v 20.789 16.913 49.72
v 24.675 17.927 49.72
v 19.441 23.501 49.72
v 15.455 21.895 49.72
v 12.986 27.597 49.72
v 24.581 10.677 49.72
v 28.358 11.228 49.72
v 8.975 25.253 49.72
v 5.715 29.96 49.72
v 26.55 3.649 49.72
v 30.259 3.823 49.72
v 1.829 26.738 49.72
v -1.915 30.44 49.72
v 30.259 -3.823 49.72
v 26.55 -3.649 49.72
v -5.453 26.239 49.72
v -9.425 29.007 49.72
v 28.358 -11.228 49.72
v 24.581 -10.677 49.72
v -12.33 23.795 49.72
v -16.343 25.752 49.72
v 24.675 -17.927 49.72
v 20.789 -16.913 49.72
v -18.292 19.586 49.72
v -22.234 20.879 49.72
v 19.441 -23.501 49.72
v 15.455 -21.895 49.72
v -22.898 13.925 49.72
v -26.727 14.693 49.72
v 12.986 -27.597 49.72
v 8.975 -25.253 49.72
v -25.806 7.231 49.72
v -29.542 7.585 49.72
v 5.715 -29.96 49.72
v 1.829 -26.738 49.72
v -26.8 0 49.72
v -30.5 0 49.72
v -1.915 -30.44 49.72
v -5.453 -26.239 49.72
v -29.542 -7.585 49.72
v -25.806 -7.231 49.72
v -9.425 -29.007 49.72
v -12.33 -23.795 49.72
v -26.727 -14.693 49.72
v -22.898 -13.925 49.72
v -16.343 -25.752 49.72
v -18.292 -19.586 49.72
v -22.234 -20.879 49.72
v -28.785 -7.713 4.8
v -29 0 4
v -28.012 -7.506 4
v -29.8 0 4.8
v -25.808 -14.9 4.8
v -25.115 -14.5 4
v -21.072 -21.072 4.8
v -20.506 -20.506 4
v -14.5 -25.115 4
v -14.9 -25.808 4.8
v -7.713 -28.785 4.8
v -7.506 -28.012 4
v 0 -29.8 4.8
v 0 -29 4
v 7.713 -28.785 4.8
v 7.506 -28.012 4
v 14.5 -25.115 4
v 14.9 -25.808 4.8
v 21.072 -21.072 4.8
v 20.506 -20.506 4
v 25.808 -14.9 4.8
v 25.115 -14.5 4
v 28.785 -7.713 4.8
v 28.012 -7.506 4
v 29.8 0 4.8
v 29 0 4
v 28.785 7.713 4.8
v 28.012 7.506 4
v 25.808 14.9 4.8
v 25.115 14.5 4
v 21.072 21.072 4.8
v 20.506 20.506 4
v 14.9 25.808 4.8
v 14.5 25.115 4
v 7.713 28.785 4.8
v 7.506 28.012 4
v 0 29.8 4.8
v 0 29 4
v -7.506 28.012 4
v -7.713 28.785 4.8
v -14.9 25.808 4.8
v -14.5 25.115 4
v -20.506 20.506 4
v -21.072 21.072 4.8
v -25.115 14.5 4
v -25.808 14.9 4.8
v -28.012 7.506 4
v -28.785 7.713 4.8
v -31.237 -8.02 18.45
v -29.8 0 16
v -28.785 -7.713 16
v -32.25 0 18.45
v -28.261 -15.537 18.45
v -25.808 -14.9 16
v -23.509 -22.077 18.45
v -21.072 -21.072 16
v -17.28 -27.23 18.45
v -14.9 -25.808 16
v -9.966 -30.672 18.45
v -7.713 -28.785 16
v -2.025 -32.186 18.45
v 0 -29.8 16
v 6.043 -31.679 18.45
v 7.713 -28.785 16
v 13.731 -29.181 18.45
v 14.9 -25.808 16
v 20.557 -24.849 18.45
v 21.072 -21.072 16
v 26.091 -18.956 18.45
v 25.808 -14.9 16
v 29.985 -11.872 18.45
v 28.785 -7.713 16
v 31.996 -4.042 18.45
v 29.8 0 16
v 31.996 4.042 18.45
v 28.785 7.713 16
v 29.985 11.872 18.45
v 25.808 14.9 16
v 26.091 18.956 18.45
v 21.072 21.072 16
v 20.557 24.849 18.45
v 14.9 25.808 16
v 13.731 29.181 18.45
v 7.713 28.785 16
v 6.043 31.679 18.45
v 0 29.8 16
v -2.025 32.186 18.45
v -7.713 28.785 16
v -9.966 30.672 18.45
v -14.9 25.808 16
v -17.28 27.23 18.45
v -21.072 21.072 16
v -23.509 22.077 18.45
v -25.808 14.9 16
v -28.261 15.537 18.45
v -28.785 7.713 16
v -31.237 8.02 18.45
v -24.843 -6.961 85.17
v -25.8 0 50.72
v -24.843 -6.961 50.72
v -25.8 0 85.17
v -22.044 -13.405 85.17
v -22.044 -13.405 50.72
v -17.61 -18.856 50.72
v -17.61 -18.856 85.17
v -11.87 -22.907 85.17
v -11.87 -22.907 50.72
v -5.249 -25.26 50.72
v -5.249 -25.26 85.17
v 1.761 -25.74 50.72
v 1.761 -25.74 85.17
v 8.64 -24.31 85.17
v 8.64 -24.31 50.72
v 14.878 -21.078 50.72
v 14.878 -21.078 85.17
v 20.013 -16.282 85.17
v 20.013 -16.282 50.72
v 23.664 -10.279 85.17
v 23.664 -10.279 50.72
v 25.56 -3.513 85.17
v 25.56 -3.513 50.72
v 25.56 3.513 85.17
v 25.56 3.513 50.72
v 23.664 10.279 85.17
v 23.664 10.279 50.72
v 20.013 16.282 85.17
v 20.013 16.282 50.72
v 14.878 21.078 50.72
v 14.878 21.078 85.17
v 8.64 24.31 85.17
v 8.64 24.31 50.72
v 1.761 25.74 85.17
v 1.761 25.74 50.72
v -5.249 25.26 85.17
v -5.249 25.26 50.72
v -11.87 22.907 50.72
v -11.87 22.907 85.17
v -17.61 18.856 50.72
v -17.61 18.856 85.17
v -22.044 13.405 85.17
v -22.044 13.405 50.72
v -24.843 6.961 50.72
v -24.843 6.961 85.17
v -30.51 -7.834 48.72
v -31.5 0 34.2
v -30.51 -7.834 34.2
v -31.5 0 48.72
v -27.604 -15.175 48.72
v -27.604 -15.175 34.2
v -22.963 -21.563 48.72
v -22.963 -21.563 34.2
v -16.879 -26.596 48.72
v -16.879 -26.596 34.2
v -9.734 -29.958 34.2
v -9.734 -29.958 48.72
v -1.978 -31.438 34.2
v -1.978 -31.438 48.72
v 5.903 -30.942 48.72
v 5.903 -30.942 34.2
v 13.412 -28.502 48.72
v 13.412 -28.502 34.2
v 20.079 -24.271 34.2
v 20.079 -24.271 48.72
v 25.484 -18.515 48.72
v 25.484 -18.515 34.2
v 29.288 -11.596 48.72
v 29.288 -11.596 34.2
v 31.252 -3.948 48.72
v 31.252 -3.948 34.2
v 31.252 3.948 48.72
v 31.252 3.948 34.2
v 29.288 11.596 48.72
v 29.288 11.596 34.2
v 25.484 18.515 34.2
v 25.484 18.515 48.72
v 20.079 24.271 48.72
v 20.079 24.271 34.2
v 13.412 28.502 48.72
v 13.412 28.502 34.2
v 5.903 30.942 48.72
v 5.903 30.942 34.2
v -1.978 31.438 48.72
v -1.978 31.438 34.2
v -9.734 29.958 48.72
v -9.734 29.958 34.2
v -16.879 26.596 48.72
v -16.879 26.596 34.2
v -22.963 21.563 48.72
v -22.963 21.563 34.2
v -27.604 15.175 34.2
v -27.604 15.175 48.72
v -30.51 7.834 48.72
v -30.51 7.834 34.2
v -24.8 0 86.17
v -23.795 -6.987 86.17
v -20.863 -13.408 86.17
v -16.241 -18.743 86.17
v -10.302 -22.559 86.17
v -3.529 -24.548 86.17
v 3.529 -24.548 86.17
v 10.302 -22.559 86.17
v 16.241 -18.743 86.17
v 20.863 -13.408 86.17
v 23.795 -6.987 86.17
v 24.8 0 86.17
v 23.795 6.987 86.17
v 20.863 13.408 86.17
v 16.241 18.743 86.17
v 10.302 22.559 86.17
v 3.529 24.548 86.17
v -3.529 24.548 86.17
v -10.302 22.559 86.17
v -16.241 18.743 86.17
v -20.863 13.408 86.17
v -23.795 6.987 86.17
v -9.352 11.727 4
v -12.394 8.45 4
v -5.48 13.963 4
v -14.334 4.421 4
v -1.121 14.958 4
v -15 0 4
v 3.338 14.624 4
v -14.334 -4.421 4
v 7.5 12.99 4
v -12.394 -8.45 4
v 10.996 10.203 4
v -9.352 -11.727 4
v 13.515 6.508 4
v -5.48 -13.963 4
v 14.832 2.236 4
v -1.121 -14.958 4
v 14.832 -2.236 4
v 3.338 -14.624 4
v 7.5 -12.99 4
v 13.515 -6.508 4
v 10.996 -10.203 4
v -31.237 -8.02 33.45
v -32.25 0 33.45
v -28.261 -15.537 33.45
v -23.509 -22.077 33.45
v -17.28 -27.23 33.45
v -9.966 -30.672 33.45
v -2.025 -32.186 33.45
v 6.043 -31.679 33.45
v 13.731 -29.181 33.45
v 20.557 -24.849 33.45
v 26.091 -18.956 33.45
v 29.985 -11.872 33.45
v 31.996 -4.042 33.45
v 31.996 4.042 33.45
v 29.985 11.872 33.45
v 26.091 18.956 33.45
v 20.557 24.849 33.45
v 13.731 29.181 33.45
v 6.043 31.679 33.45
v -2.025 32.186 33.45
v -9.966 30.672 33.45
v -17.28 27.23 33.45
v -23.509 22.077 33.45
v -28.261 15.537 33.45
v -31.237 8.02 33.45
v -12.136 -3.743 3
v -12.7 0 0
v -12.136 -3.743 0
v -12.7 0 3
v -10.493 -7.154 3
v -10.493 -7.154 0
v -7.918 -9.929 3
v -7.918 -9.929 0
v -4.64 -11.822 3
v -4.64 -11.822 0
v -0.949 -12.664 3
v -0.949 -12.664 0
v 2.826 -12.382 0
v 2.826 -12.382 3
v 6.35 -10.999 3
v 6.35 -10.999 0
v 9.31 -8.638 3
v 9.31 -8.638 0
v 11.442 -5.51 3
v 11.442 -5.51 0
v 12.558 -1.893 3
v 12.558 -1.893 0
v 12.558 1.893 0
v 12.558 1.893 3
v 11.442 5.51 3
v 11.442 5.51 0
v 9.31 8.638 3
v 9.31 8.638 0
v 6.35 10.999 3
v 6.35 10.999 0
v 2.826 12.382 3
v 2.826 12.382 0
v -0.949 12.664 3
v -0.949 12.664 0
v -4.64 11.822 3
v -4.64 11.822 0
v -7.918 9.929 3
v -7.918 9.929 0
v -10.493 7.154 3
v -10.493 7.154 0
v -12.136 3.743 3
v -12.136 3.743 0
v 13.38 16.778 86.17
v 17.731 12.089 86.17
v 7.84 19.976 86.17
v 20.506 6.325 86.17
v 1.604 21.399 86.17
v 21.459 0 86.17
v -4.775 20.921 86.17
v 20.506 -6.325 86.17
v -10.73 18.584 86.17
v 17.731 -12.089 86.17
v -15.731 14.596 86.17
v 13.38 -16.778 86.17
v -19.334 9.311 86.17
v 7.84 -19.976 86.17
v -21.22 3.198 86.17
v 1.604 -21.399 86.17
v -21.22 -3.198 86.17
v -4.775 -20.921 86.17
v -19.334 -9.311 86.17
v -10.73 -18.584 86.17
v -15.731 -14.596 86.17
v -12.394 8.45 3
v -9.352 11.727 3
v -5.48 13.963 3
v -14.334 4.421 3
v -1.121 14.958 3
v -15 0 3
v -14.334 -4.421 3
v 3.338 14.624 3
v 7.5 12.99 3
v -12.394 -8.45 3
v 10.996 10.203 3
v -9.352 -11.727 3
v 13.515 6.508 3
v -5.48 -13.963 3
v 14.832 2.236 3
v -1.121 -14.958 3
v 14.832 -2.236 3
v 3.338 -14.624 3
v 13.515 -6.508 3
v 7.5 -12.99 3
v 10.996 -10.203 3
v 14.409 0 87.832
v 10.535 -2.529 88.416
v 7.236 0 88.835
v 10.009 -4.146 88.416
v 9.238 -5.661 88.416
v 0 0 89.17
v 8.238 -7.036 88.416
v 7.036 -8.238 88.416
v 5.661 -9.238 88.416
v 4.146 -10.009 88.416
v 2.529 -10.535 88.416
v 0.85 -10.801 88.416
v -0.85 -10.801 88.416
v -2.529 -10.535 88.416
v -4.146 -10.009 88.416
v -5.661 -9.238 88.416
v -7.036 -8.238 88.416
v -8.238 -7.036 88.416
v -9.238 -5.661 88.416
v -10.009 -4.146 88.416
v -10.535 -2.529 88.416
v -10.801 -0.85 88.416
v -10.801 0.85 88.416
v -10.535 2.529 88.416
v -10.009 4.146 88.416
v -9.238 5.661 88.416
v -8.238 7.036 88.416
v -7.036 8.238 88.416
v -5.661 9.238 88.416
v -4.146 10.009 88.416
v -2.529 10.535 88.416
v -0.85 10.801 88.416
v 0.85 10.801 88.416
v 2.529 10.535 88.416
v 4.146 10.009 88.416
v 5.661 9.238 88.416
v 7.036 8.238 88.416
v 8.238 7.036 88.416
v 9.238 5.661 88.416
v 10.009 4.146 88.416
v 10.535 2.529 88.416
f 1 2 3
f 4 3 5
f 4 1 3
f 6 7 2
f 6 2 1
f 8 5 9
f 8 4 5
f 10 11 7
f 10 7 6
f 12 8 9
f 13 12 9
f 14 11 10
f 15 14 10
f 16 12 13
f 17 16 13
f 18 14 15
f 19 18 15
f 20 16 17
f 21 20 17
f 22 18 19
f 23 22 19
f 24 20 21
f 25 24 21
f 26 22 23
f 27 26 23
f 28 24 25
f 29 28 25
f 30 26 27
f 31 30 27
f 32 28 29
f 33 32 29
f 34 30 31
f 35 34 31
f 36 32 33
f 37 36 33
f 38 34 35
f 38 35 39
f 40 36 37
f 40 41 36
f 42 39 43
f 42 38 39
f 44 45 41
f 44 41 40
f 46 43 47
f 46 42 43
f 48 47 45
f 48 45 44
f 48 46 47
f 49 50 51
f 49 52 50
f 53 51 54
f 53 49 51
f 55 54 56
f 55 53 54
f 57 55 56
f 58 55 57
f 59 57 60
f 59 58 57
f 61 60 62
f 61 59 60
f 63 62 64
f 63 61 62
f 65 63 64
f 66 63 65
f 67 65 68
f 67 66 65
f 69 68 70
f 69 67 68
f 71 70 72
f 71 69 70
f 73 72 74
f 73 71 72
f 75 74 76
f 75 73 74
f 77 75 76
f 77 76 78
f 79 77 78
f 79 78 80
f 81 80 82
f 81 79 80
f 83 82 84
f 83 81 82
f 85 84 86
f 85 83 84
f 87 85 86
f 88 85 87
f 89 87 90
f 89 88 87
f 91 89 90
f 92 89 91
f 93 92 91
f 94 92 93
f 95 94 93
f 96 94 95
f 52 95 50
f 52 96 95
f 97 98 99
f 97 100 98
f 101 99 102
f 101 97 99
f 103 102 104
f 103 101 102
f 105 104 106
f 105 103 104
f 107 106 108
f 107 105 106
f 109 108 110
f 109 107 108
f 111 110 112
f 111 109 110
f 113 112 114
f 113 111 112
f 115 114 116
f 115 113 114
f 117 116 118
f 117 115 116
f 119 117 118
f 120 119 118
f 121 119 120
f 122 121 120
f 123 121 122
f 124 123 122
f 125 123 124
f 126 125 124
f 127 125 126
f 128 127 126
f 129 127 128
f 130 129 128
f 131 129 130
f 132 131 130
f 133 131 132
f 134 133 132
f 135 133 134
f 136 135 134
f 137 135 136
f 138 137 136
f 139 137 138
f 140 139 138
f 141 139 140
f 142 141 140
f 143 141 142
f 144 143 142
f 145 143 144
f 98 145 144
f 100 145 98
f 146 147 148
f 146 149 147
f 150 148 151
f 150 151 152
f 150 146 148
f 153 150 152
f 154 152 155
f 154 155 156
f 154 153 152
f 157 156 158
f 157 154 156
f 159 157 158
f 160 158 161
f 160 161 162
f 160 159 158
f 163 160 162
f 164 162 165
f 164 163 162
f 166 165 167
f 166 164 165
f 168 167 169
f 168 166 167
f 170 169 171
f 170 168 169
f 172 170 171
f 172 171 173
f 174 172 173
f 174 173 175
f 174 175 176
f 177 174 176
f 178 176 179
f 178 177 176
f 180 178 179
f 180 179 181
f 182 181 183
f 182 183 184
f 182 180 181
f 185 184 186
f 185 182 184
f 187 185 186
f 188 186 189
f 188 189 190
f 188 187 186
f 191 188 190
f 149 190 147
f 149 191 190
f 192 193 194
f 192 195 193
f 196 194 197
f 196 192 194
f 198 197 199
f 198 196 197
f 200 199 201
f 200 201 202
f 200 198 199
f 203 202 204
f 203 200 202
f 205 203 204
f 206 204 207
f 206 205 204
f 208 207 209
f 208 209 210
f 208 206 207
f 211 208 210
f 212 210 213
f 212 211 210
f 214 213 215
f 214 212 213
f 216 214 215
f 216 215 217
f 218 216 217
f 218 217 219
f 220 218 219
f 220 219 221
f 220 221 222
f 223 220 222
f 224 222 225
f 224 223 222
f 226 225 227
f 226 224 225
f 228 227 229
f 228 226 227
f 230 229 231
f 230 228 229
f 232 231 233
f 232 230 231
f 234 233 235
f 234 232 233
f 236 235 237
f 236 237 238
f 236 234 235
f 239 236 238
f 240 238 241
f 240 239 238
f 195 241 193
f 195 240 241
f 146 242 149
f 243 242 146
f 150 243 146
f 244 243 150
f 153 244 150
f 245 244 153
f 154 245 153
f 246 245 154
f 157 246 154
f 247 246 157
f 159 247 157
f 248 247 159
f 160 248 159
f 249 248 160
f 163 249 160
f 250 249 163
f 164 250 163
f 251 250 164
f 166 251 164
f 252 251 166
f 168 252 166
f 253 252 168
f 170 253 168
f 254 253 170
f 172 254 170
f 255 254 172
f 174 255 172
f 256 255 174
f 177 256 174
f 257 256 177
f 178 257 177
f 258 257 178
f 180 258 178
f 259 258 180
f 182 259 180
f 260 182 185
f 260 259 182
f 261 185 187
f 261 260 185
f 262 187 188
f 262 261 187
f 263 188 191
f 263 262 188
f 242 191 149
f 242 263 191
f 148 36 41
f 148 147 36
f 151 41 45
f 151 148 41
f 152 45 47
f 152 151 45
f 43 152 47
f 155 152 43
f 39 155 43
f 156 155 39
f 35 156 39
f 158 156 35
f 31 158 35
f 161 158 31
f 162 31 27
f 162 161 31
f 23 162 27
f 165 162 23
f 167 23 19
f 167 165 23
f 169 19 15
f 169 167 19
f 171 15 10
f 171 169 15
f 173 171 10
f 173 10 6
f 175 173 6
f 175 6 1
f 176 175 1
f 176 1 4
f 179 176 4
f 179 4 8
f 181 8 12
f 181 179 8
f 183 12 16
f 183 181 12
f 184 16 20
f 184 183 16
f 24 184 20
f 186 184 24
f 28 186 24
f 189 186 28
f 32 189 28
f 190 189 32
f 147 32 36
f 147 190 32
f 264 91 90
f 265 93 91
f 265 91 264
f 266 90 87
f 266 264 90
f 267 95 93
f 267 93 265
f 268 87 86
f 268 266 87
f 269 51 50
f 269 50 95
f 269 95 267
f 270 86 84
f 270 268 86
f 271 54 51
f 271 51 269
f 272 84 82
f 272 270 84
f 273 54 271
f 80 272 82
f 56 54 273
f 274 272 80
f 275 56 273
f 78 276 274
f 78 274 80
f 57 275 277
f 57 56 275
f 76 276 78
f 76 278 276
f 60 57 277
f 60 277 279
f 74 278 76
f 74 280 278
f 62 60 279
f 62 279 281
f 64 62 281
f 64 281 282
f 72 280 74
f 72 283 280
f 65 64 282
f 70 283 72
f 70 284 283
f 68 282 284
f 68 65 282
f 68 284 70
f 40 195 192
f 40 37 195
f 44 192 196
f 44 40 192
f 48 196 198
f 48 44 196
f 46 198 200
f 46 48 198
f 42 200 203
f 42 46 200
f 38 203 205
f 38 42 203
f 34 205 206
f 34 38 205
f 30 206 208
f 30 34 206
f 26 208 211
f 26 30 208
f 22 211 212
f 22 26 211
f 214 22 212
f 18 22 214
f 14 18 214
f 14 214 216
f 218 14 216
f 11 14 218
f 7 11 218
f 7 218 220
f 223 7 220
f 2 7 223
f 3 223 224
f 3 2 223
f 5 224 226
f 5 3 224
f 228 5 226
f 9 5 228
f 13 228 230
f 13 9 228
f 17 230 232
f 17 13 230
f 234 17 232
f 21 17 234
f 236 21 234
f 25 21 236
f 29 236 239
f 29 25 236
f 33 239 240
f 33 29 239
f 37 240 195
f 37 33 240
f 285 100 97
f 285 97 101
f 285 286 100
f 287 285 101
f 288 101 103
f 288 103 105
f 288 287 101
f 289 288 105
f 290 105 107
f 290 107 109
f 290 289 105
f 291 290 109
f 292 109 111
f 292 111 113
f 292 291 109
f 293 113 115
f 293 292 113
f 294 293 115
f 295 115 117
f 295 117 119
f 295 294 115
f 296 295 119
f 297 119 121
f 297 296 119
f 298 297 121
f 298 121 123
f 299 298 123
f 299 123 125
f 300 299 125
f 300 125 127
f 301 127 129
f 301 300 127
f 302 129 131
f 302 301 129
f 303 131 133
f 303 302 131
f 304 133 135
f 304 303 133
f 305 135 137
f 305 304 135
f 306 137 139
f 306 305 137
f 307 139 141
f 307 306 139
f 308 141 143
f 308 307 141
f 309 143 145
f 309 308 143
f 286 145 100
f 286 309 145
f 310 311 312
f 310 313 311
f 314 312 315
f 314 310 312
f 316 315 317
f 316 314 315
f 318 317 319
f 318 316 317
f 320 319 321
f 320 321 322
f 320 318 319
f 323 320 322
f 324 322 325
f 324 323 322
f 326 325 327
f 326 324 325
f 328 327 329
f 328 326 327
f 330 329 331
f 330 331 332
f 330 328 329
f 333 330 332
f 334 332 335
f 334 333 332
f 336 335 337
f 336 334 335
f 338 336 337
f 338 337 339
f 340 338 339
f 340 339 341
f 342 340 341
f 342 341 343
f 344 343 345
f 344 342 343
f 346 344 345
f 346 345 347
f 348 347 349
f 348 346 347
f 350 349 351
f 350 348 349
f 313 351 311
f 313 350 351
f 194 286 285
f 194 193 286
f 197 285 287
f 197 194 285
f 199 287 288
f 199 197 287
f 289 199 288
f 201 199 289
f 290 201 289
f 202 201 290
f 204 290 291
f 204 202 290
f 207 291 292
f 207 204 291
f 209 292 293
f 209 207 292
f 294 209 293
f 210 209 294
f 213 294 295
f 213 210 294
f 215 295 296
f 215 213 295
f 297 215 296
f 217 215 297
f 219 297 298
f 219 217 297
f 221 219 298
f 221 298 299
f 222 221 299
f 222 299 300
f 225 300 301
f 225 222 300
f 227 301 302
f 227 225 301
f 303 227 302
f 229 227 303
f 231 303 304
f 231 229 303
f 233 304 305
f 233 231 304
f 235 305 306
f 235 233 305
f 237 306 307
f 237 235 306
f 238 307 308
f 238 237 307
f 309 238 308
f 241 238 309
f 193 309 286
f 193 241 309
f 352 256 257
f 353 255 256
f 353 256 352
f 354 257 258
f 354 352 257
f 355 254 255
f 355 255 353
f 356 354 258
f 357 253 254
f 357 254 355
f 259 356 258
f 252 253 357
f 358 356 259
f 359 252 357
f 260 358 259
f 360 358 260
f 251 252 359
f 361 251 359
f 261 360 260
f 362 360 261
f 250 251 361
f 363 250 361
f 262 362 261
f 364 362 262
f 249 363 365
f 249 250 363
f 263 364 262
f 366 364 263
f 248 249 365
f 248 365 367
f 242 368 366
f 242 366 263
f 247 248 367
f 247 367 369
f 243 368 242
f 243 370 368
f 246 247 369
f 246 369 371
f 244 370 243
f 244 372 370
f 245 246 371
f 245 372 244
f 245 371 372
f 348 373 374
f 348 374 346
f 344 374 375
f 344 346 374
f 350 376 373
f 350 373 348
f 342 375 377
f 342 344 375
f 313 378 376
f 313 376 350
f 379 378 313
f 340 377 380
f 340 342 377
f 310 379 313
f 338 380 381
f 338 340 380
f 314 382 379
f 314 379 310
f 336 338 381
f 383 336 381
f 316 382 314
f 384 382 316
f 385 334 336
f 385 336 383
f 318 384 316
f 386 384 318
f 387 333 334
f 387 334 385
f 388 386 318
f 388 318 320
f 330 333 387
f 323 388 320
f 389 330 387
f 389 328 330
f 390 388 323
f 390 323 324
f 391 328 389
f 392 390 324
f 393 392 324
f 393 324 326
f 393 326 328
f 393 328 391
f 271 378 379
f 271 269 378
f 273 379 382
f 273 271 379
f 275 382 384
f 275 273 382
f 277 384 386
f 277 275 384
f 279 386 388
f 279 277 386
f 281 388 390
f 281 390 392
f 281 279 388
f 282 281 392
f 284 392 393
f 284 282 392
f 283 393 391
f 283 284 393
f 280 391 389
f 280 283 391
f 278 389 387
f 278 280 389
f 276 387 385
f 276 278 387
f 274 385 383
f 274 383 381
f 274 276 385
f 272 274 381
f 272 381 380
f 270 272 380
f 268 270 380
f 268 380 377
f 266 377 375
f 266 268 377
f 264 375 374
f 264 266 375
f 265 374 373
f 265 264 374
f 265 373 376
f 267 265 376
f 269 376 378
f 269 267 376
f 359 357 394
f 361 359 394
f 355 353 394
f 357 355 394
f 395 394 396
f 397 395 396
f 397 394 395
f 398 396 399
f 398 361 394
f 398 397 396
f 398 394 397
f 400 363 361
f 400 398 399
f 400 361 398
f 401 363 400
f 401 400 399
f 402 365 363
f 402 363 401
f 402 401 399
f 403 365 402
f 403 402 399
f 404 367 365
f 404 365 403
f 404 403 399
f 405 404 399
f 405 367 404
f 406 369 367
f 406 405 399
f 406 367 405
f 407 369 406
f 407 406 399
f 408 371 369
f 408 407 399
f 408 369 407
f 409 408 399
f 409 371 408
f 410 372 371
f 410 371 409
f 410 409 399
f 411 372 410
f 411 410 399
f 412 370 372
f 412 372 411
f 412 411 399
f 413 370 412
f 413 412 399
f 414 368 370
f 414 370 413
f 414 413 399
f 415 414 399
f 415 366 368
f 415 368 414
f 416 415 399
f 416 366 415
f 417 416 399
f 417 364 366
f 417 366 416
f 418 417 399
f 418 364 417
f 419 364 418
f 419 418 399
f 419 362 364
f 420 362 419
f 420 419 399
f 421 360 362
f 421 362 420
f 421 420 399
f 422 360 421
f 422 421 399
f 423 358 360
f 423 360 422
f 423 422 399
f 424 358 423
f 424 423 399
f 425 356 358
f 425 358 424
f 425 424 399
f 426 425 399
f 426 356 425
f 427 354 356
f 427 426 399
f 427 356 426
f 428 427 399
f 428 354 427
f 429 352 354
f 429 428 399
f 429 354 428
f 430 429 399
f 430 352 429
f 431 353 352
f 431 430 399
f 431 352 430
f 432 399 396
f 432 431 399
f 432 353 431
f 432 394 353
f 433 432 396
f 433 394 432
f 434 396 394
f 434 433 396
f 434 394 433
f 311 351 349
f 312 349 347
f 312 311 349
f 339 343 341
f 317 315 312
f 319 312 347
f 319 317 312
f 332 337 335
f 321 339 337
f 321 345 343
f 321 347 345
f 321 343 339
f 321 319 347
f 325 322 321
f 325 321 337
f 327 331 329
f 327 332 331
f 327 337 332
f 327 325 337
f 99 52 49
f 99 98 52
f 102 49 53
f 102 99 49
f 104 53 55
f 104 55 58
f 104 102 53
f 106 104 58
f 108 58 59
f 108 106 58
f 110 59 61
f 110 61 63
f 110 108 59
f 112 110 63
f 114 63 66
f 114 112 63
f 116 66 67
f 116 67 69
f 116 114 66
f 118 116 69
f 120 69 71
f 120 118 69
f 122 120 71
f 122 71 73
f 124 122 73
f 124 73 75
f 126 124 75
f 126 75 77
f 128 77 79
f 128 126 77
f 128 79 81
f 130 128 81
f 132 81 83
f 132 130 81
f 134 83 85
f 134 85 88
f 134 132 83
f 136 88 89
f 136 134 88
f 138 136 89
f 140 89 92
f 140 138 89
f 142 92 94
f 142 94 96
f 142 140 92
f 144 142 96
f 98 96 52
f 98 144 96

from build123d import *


with BuildPart() as part:
    # Эскиз1 → Повернуть1 (revolve)
    with BuildSketch(Plane(origin=(0, 0, 0), x_dir=(1, 0, 0), z_dir=(0, 1, 0)), mode=Mode.PRIVATE) as revolve_1_sk:
        Polygon((0, 0), (12.7, 0), (12.7, -3), (15, -3), (15, -4), (29, -4), (29.8, -4.8), (29.8, -16), (32.25, -18.45), (32.25, -33.45), (31.5, -34.2), (31.5, -48.72), (30.5, -49.72), (26.8, -49.72), (25.8, -50.72), (25.8, -85.17), (24.8, -86.17), (0, -86.17), align=None)
    revolve(revolve_1_sk.sketch.rotate(Axis((0, 0, 0), (0, 0, 1)), 180), axis=Axis((0, 0, 0), (0, 0, 1)))

    # Эскиз2 → Повернуть2 (revolve)
    with BuildSketch(Plane(origin=(0, 0, 0), x_dir=(1, 0, 0), z_dir=(0, 1, 0))):
        with BuildLine():
            Line((0, -86.17), (0, -89.17))
            ThreePointArc((0, -89.17), (10.83404162, -88.416370928), (21.459399602, -86.17))
            Line((21.459399602, -86.17), (0, -86.17))
        make_face()
    revolve(axis=Axis((0, 0, 2.482382031), (0, 0, -1)))


solid = part.part
